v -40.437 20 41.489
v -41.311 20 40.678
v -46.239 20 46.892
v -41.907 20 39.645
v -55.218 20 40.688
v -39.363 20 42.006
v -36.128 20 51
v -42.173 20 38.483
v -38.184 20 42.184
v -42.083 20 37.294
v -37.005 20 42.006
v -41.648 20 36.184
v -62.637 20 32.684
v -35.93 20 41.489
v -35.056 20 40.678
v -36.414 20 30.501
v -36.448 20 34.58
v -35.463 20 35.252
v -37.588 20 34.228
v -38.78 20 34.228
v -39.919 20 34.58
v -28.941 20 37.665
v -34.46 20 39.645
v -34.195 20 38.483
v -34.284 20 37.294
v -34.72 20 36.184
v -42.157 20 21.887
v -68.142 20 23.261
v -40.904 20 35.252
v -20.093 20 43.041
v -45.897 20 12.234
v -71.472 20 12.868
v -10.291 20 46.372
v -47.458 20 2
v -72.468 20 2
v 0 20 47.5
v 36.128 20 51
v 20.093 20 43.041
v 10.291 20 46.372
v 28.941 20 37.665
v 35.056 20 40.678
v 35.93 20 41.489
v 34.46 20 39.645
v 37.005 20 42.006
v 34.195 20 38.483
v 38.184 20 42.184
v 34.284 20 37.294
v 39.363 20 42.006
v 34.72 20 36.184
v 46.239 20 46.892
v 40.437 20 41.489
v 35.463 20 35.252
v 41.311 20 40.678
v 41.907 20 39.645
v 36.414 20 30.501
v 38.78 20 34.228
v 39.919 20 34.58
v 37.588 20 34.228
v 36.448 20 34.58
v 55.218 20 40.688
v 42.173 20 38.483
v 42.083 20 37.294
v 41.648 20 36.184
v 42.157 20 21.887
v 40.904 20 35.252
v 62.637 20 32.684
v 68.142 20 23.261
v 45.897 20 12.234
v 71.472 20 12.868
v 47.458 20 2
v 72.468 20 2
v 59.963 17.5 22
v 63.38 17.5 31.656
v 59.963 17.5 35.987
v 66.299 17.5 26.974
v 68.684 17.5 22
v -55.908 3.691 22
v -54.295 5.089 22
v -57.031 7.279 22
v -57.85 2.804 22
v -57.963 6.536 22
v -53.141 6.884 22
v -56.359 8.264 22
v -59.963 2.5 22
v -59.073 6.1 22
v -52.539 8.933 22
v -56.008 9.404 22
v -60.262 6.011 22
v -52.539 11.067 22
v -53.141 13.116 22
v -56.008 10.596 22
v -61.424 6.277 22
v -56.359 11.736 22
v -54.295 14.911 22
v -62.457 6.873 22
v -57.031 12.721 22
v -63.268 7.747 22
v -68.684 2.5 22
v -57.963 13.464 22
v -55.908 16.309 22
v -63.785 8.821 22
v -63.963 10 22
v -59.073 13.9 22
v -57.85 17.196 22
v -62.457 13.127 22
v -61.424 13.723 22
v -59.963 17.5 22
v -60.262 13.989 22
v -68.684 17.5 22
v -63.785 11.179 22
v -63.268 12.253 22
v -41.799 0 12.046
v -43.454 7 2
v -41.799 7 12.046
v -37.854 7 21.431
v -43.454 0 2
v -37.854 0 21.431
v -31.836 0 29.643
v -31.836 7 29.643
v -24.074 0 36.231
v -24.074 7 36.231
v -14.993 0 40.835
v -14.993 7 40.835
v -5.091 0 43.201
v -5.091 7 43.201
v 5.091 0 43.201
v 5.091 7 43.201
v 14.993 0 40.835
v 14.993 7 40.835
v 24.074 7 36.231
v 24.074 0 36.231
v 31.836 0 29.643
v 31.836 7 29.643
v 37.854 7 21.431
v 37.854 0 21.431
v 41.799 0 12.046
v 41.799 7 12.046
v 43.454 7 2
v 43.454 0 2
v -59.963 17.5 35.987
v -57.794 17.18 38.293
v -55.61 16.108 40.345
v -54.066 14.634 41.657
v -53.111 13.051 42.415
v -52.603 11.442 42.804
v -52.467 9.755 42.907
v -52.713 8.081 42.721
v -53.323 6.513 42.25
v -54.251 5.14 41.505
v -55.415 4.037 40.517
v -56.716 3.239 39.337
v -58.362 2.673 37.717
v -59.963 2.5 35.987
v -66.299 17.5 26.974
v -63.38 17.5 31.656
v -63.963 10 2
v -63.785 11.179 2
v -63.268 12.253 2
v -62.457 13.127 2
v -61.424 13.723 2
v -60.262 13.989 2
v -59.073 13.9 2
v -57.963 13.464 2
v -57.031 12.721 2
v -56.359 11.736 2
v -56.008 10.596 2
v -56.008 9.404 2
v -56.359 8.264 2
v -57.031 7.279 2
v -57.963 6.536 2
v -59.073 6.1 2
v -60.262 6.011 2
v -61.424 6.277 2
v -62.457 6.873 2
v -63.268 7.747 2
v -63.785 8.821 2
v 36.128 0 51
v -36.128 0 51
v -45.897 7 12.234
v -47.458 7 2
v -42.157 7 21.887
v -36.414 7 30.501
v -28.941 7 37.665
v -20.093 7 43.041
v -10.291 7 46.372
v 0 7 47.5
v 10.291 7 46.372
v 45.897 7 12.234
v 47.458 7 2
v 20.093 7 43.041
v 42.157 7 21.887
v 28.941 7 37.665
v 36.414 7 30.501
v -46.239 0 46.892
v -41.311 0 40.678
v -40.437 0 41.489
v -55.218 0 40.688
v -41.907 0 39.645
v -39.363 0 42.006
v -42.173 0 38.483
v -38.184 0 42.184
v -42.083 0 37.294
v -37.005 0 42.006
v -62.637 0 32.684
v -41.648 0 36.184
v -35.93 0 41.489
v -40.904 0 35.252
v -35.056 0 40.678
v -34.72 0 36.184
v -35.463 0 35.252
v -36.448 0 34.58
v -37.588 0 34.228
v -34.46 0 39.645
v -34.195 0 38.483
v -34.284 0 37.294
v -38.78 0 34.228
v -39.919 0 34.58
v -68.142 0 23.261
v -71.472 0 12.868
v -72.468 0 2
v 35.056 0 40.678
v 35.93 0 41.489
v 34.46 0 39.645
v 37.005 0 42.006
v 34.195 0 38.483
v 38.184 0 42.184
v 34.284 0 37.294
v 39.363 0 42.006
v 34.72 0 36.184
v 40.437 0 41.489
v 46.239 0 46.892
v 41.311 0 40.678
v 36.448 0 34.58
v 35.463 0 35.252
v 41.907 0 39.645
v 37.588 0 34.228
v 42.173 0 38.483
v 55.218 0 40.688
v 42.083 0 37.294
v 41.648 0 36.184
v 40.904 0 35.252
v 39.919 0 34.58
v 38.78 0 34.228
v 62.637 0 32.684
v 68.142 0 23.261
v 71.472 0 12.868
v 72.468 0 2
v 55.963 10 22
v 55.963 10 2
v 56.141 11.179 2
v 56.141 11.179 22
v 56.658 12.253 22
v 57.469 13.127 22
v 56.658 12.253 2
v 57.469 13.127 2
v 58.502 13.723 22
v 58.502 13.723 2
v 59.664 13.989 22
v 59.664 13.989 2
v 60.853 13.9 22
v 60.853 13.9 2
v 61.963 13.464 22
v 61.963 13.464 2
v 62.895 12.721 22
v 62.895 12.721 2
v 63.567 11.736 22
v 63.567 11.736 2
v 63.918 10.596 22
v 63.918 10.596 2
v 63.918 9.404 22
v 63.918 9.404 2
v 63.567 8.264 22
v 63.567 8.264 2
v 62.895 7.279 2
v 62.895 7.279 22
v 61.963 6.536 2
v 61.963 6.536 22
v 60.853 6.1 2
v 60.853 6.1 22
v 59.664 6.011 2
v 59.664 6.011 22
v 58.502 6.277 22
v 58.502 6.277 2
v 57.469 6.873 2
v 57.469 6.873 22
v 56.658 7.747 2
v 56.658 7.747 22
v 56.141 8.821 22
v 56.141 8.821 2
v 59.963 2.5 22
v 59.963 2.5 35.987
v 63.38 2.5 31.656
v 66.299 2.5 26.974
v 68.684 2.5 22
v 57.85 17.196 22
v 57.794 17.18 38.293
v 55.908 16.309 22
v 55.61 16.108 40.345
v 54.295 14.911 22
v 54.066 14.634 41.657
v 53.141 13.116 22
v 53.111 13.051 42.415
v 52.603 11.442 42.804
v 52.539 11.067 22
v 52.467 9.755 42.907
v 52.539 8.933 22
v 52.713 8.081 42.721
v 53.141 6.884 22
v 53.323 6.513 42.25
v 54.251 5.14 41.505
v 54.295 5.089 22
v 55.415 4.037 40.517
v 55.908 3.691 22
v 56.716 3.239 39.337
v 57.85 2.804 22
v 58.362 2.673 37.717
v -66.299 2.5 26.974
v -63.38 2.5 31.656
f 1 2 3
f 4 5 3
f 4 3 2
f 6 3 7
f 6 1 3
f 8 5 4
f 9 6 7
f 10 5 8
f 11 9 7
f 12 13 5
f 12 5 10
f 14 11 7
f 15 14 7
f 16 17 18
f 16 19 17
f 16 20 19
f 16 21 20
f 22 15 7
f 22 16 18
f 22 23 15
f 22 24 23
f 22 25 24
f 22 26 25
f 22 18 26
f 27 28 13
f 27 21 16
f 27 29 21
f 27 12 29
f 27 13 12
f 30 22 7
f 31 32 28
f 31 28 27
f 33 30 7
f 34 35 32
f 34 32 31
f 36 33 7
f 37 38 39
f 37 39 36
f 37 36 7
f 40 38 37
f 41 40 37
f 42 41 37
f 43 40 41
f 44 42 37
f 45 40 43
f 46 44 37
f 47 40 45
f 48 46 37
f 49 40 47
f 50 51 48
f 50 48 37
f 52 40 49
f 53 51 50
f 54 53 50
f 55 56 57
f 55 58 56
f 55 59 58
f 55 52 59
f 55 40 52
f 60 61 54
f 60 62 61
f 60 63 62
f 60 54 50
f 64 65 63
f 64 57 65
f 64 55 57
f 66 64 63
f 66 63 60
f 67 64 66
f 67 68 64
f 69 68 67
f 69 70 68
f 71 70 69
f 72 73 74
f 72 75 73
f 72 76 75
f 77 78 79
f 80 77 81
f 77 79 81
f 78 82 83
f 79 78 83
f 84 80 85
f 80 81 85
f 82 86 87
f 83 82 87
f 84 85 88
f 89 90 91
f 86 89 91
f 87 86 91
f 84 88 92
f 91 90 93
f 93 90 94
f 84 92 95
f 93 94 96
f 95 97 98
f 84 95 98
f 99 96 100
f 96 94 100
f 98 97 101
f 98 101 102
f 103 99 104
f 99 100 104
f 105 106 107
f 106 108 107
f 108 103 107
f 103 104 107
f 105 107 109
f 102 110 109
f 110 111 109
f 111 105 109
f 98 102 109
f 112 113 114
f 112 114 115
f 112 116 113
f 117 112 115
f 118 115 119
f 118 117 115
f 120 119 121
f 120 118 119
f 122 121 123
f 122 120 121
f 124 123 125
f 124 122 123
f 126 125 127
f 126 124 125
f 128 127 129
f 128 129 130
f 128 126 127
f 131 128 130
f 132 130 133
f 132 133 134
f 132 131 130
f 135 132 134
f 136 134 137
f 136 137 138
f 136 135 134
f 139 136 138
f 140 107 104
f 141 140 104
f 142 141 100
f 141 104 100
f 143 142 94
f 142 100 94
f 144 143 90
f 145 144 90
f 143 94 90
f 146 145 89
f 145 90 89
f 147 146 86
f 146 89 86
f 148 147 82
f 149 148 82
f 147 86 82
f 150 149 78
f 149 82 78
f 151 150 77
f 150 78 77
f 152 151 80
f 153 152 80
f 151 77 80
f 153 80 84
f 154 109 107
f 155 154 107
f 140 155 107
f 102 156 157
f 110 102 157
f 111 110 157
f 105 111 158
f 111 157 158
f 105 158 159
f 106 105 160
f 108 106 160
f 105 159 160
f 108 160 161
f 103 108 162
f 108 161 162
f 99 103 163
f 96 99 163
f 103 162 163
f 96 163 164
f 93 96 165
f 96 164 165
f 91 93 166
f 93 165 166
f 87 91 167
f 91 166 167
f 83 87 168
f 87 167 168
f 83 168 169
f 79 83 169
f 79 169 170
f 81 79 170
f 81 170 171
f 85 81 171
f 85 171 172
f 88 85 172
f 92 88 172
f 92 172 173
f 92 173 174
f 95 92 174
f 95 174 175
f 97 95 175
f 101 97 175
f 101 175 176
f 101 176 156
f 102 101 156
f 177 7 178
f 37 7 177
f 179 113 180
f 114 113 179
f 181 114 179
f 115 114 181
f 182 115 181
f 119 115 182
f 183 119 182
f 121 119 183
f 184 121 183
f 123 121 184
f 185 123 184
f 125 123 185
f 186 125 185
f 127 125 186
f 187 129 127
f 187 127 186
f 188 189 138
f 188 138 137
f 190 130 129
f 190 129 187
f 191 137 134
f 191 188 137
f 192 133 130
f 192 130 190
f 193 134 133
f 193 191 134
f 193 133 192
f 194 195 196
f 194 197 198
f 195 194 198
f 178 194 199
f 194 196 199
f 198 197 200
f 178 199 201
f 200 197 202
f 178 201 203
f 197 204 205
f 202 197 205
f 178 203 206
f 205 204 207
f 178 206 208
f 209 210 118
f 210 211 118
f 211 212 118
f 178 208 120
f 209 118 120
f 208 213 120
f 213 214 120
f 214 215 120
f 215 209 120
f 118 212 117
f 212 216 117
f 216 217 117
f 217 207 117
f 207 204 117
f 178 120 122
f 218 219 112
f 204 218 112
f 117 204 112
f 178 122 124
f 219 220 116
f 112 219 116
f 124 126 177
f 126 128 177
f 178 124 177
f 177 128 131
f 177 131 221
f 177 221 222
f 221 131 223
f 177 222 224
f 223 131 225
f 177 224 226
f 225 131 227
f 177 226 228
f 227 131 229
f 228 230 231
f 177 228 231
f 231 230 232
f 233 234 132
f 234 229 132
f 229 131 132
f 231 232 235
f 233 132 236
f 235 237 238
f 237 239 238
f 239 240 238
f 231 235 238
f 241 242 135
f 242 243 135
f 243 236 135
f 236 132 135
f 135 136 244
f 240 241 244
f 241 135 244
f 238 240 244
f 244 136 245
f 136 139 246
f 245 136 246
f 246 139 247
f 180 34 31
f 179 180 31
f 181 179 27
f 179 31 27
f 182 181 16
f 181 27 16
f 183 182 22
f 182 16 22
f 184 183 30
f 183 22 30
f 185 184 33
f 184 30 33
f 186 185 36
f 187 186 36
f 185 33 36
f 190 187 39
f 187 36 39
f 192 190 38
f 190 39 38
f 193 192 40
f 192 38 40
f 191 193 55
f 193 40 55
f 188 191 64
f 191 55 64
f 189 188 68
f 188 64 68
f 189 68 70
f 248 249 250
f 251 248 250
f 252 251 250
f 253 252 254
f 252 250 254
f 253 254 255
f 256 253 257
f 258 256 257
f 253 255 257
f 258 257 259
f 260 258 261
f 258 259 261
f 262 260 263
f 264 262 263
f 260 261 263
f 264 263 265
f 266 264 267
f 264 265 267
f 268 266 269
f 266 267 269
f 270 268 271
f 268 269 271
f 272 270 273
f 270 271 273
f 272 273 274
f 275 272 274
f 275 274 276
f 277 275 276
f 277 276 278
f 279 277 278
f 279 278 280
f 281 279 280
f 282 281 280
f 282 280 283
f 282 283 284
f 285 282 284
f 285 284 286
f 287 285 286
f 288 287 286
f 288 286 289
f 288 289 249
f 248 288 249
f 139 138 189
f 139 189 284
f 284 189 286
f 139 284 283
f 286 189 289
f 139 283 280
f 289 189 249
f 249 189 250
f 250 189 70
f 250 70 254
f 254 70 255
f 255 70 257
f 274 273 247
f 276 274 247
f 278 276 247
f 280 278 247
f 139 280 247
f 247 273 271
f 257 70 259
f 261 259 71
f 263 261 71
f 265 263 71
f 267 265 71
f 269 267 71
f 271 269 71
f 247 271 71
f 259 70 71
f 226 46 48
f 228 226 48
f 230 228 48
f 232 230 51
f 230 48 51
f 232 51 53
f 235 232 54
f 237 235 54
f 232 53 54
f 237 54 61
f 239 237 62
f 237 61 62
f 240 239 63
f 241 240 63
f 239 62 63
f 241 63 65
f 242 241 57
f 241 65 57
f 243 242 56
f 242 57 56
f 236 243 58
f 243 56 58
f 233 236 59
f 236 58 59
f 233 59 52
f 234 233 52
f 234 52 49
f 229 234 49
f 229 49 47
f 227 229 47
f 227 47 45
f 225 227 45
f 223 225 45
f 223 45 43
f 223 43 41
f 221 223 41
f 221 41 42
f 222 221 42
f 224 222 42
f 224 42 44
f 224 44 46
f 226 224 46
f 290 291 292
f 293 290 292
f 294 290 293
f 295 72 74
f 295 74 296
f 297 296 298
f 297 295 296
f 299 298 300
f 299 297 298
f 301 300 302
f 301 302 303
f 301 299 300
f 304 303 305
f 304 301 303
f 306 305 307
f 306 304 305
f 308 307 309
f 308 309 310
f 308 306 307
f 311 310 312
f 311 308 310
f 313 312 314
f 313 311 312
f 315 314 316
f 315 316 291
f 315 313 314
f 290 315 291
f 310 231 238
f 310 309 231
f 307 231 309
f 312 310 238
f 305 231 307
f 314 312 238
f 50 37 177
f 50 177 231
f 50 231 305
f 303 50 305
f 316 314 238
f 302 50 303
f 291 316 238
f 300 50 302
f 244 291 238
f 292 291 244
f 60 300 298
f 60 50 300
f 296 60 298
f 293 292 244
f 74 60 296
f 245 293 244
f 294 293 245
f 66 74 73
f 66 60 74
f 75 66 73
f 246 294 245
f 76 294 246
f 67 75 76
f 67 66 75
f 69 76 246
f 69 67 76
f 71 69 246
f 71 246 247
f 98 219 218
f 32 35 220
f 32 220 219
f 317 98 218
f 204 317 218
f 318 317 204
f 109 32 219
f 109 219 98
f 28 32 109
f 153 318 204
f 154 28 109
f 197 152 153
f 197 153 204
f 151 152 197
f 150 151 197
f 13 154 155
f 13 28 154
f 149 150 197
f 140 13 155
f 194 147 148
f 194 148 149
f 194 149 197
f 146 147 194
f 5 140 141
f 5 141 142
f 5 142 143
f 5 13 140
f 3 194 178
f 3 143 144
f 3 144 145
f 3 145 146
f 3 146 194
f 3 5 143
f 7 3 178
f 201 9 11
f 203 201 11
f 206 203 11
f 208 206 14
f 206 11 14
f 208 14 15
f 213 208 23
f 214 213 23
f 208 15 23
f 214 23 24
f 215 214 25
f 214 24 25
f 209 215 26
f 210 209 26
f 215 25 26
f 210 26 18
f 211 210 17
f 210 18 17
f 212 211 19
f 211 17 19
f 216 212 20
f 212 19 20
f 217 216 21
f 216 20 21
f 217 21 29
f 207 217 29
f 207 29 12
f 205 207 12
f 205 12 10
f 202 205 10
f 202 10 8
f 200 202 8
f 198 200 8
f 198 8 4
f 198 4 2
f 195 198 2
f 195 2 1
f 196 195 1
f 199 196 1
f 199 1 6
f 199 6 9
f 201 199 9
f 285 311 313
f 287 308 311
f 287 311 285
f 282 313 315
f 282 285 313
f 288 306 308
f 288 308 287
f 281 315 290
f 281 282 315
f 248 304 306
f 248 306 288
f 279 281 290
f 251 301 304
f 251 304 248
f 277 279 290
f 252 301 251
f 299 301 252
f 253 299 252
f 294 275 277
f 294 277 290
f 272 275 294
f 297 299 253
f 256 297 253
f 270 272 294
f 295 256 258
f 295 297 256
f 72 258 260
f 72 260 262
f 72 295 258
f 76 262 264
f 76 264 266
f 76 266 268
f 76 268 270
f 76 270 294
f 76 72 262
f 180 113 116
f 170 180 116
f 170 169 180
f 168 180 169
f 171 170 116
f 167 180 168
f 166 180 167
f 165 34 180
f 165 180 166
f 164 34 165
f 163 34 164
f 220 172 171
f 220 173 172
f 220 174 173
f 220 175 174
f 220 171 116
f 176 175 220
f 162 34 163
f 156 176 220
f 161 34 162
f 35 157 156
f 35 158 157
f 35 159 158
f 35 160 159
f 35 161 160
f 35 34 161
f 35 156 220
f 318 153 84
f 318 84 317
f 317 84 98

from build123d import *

# Parameters (mm, degrees)
SKETCH1_R           = 62.5
SKETCH1_R_2         = 43.5
BOSS_EXTRUDE1_DEPTH = 20
SKETCH2_R           = 47.5
CUT_EXTRUDE1_DEPTH  = 13
SKETCH3_R           = 4
CUT_EXTRUDE2_DEPTH  = 91.622844802
SKETCH4_W           = 150
SKETCH4_H           = 64.5
SKETCH4_W_2         = 72.256487598
SKETCH4_H_2         = 11.5
CUT_EXTRUDE3_DEPTH  = 91.622844802
BOSS_EXTRUDE4_DEPTH = 20
SKETCH7_R           = 4
CUT_EXTRUDE4_DEPTH  = 90.742875716
SKETCH8_R           = 4
CUT_EXTRUDE5_DEPTH  = 90.742875874
CUT_EXTRUDE6_START  = -20
SKETCH12_W          = 2.494942127
SKETCH12_H          = 15
SKETCH12_R          = 7.5
SKETCH12_R_2        = 4
CUT_EXTRUDE6_DEPTH  = 70.742875874


with BuildPart() as part:
    # Sketch1 → Boss-Extrude1 (new body)
    with BuildSketch(Plane(origin=(0, 0, 0), x_dir=(1, 0, 0), z_dir=(0, 1, 0))):
        with Locations(Location((0, 0, 0), (0, 0, 270))):
            Circle(SKETCH1_R)
        with Locations(Location((0, 0, 0), (0, 0, 270))):
            Circle(SKETCH1_R_2, mode=Mode.SUBTRACT)
    extrude(amount=BOSS_EXTRUDE1_DEPTH)

    # Sketch2 → Cut-Extrude1 (cut)
    with BuildSketch(Plane(origin=(0, 20, 0), x_dir=(1, 0, 0), z_dir=(0, 1, 0))):
        with Locations(Location((0, 0, 0), (0, 0, 270))):
            Circle(SKETCH2_R)
    extrude(amount=-CUT_EXTRUDE1_DEPTH, mode=Mode.SUBTRACT)

    # Sketch3 → Cut-Extrude2 (cut, through all)
    with BuildSketch(Plane(origin=(0, 20, 0), x_dir=(1, 0, 0), z_dir=(0, 1, 0))):
        with Locations(Location((38.183766184, 38.183766184, 0), (0, 0, 270))):
            Circle(SKETCH3_R)
        with Locations(Location((38.183766184, -38.183766184, 0), (0, 0, 270))):
            Circle(SKETCH3_R)
        with Locations(Location((-38.183766184, -38.183766184, 0), (0, 0, 270))):
            Circle(SKETCH3_R)
        with Locations(Location((-38.183766184, 38.183766184, 0), (0, 0, 270))):
            Circle(SKETCH3_R)
    extrude(amount=-CUT_EXTRUDE2_DEPTH, mode=Mode.SUBTRACT)

    # Sketch4 → Cut-Extrude3 (cut, through all)
    with BuildSketch(Plane(origin=(0, 20, 0), x_dir=(1, 0, 0), z_dir=(0, 1, 0))):
        with Locations((0, 30.25)):
            Rectangle(SKETCH4_W, SKETCH4_H)
        with Locations((0, -56.75)):
            Rectangle(SKETCH4_W_2, SKETCH4_H_2)
    extrude(amount=-CUT_EXTRUDE3_DEPTH, mode=Mode.SUBTRACT)

    # Sketch6 → Boss-Extrude4 (add, through all)
    with BuildSketch(Plane(origin=(0, 20, 0), x_dir=(1, 0, 0), z_dir=(0, 1, 0))):
        with BuildLine():
            Line((-62.467991804, -2), (-72.467991804, -2))
            ThreePointArc((-72.467991804, -2), (-62.636910051, -32.684277735), (-36.128243799, -51))
            ThreePointArc((-36.128243799, -51), (-55.050471558, -29.592154049), (-62.467991804, -2))
        make_face()
        with BuildLine():
            ThreePointArc((62.467991804, -2), (55.050471558, -29.592154049), (36.128243799, -51))
            ThreePointArc((36.128243799, -51), (62.636910051, -32.684277735), (72.467991804, -2))
            Line((72.467991804, -2), (62.467991804, -2))
        make_face()
    extrude(amount=-BOSS_EXTRUDE4_DEPTH)

    # Sketch7 → Cut-Extrude4 (cut, through all)
    with BuildSketch(Plane(origin=(0, 0, 2), x_dir=(-1, 0, 0), z_dir=(0, 0, -1))):
        with Locations((-59.962933931, 10)):
            Circle(SKETCH7_R)
    extrude(amount=-CUT_EXTRUDE4_DEPTH, mode=Mode.SUBTRACT)

    # Sketch8 → Cut-Extrude5 (cut, through all)
    with BuildSketch(Plane(origin=(0, 0, 2), x_dir=(-1, 0, 0), z_dir=(0, 0, -1))):
        with Locations((59.962933931, 10)):
            Circle(SKETCH8_R)
    extrude(amount=-CUT_EXTRUDE5_DEPTH, mode=Mode.SUBTRACT)

    # Sketch12 → Cut-Extrude6 (cut, through all)
    # profile 1 of 3: a face of its own
    with BuildSketch(Plane(origin=(0, 0, 2), x_dir=(-1, 0, 0), z_dir=(0, 0, -1)).offset(CUT_EXTRUDE6_START)):
        with Locations((73.715462868, 10)):
            Rectangle(SKETCH12_W, SKETCH12_H)
    # profile 2 of 3: a face of its own
    with BuildSketch(Plane(origin=(0, 0, 2), x_dir=(-1, 0, 0), z_dir=(0, 0, -1)).offset(CUT_EXTRUDE6_START)):
        with Locations((59.962933931, 10)):
            Circle(SKETCH12_R)
        with Locations((59.962933931, 10)):
            Circle(SKETCH12_R_2, mode=Mode.SUBTRACT)
    # profile 3 of 3: a face of its own
    with BuildSketch(Plane(origin=(0, 0, 2), x_dir=(-1, 0, 0), z_dir=(0, 0, -1)).offset(CUT_EXTRUDE6_START)):
        with BuildLine():
            Line((59.962933931, 2.5), (72.467991804, 2.5))
            Line((72.467991804, 2.5), (72.467991804, 17.5))
            Line((72.467991804, 17.5), (59.962933931, 17.5))
            ThreePointArc((59.962933931, 17.5), (65.26623479, 15.303300859), (67.462933931, 10))
            ThreePointArc((67.462933931, 10), (65.26623479, 4.696699141), (59.962933931, 2.5))
        make_face()
    cut_extrude6 = extrude(amount=-CUT_EXTRUDE6_DEPTH, mode=Mode.SUBTRACT)

    # Mirror1: Cut-Extrude6 across plane
    add(cut_extrude6.mirror(Plane(origin=(0, 0, 0), x_dir=(0, 0, 1), z_dir=(1, 0, 0))), mode=Mode.SUBTRACT)


solid = part.part
